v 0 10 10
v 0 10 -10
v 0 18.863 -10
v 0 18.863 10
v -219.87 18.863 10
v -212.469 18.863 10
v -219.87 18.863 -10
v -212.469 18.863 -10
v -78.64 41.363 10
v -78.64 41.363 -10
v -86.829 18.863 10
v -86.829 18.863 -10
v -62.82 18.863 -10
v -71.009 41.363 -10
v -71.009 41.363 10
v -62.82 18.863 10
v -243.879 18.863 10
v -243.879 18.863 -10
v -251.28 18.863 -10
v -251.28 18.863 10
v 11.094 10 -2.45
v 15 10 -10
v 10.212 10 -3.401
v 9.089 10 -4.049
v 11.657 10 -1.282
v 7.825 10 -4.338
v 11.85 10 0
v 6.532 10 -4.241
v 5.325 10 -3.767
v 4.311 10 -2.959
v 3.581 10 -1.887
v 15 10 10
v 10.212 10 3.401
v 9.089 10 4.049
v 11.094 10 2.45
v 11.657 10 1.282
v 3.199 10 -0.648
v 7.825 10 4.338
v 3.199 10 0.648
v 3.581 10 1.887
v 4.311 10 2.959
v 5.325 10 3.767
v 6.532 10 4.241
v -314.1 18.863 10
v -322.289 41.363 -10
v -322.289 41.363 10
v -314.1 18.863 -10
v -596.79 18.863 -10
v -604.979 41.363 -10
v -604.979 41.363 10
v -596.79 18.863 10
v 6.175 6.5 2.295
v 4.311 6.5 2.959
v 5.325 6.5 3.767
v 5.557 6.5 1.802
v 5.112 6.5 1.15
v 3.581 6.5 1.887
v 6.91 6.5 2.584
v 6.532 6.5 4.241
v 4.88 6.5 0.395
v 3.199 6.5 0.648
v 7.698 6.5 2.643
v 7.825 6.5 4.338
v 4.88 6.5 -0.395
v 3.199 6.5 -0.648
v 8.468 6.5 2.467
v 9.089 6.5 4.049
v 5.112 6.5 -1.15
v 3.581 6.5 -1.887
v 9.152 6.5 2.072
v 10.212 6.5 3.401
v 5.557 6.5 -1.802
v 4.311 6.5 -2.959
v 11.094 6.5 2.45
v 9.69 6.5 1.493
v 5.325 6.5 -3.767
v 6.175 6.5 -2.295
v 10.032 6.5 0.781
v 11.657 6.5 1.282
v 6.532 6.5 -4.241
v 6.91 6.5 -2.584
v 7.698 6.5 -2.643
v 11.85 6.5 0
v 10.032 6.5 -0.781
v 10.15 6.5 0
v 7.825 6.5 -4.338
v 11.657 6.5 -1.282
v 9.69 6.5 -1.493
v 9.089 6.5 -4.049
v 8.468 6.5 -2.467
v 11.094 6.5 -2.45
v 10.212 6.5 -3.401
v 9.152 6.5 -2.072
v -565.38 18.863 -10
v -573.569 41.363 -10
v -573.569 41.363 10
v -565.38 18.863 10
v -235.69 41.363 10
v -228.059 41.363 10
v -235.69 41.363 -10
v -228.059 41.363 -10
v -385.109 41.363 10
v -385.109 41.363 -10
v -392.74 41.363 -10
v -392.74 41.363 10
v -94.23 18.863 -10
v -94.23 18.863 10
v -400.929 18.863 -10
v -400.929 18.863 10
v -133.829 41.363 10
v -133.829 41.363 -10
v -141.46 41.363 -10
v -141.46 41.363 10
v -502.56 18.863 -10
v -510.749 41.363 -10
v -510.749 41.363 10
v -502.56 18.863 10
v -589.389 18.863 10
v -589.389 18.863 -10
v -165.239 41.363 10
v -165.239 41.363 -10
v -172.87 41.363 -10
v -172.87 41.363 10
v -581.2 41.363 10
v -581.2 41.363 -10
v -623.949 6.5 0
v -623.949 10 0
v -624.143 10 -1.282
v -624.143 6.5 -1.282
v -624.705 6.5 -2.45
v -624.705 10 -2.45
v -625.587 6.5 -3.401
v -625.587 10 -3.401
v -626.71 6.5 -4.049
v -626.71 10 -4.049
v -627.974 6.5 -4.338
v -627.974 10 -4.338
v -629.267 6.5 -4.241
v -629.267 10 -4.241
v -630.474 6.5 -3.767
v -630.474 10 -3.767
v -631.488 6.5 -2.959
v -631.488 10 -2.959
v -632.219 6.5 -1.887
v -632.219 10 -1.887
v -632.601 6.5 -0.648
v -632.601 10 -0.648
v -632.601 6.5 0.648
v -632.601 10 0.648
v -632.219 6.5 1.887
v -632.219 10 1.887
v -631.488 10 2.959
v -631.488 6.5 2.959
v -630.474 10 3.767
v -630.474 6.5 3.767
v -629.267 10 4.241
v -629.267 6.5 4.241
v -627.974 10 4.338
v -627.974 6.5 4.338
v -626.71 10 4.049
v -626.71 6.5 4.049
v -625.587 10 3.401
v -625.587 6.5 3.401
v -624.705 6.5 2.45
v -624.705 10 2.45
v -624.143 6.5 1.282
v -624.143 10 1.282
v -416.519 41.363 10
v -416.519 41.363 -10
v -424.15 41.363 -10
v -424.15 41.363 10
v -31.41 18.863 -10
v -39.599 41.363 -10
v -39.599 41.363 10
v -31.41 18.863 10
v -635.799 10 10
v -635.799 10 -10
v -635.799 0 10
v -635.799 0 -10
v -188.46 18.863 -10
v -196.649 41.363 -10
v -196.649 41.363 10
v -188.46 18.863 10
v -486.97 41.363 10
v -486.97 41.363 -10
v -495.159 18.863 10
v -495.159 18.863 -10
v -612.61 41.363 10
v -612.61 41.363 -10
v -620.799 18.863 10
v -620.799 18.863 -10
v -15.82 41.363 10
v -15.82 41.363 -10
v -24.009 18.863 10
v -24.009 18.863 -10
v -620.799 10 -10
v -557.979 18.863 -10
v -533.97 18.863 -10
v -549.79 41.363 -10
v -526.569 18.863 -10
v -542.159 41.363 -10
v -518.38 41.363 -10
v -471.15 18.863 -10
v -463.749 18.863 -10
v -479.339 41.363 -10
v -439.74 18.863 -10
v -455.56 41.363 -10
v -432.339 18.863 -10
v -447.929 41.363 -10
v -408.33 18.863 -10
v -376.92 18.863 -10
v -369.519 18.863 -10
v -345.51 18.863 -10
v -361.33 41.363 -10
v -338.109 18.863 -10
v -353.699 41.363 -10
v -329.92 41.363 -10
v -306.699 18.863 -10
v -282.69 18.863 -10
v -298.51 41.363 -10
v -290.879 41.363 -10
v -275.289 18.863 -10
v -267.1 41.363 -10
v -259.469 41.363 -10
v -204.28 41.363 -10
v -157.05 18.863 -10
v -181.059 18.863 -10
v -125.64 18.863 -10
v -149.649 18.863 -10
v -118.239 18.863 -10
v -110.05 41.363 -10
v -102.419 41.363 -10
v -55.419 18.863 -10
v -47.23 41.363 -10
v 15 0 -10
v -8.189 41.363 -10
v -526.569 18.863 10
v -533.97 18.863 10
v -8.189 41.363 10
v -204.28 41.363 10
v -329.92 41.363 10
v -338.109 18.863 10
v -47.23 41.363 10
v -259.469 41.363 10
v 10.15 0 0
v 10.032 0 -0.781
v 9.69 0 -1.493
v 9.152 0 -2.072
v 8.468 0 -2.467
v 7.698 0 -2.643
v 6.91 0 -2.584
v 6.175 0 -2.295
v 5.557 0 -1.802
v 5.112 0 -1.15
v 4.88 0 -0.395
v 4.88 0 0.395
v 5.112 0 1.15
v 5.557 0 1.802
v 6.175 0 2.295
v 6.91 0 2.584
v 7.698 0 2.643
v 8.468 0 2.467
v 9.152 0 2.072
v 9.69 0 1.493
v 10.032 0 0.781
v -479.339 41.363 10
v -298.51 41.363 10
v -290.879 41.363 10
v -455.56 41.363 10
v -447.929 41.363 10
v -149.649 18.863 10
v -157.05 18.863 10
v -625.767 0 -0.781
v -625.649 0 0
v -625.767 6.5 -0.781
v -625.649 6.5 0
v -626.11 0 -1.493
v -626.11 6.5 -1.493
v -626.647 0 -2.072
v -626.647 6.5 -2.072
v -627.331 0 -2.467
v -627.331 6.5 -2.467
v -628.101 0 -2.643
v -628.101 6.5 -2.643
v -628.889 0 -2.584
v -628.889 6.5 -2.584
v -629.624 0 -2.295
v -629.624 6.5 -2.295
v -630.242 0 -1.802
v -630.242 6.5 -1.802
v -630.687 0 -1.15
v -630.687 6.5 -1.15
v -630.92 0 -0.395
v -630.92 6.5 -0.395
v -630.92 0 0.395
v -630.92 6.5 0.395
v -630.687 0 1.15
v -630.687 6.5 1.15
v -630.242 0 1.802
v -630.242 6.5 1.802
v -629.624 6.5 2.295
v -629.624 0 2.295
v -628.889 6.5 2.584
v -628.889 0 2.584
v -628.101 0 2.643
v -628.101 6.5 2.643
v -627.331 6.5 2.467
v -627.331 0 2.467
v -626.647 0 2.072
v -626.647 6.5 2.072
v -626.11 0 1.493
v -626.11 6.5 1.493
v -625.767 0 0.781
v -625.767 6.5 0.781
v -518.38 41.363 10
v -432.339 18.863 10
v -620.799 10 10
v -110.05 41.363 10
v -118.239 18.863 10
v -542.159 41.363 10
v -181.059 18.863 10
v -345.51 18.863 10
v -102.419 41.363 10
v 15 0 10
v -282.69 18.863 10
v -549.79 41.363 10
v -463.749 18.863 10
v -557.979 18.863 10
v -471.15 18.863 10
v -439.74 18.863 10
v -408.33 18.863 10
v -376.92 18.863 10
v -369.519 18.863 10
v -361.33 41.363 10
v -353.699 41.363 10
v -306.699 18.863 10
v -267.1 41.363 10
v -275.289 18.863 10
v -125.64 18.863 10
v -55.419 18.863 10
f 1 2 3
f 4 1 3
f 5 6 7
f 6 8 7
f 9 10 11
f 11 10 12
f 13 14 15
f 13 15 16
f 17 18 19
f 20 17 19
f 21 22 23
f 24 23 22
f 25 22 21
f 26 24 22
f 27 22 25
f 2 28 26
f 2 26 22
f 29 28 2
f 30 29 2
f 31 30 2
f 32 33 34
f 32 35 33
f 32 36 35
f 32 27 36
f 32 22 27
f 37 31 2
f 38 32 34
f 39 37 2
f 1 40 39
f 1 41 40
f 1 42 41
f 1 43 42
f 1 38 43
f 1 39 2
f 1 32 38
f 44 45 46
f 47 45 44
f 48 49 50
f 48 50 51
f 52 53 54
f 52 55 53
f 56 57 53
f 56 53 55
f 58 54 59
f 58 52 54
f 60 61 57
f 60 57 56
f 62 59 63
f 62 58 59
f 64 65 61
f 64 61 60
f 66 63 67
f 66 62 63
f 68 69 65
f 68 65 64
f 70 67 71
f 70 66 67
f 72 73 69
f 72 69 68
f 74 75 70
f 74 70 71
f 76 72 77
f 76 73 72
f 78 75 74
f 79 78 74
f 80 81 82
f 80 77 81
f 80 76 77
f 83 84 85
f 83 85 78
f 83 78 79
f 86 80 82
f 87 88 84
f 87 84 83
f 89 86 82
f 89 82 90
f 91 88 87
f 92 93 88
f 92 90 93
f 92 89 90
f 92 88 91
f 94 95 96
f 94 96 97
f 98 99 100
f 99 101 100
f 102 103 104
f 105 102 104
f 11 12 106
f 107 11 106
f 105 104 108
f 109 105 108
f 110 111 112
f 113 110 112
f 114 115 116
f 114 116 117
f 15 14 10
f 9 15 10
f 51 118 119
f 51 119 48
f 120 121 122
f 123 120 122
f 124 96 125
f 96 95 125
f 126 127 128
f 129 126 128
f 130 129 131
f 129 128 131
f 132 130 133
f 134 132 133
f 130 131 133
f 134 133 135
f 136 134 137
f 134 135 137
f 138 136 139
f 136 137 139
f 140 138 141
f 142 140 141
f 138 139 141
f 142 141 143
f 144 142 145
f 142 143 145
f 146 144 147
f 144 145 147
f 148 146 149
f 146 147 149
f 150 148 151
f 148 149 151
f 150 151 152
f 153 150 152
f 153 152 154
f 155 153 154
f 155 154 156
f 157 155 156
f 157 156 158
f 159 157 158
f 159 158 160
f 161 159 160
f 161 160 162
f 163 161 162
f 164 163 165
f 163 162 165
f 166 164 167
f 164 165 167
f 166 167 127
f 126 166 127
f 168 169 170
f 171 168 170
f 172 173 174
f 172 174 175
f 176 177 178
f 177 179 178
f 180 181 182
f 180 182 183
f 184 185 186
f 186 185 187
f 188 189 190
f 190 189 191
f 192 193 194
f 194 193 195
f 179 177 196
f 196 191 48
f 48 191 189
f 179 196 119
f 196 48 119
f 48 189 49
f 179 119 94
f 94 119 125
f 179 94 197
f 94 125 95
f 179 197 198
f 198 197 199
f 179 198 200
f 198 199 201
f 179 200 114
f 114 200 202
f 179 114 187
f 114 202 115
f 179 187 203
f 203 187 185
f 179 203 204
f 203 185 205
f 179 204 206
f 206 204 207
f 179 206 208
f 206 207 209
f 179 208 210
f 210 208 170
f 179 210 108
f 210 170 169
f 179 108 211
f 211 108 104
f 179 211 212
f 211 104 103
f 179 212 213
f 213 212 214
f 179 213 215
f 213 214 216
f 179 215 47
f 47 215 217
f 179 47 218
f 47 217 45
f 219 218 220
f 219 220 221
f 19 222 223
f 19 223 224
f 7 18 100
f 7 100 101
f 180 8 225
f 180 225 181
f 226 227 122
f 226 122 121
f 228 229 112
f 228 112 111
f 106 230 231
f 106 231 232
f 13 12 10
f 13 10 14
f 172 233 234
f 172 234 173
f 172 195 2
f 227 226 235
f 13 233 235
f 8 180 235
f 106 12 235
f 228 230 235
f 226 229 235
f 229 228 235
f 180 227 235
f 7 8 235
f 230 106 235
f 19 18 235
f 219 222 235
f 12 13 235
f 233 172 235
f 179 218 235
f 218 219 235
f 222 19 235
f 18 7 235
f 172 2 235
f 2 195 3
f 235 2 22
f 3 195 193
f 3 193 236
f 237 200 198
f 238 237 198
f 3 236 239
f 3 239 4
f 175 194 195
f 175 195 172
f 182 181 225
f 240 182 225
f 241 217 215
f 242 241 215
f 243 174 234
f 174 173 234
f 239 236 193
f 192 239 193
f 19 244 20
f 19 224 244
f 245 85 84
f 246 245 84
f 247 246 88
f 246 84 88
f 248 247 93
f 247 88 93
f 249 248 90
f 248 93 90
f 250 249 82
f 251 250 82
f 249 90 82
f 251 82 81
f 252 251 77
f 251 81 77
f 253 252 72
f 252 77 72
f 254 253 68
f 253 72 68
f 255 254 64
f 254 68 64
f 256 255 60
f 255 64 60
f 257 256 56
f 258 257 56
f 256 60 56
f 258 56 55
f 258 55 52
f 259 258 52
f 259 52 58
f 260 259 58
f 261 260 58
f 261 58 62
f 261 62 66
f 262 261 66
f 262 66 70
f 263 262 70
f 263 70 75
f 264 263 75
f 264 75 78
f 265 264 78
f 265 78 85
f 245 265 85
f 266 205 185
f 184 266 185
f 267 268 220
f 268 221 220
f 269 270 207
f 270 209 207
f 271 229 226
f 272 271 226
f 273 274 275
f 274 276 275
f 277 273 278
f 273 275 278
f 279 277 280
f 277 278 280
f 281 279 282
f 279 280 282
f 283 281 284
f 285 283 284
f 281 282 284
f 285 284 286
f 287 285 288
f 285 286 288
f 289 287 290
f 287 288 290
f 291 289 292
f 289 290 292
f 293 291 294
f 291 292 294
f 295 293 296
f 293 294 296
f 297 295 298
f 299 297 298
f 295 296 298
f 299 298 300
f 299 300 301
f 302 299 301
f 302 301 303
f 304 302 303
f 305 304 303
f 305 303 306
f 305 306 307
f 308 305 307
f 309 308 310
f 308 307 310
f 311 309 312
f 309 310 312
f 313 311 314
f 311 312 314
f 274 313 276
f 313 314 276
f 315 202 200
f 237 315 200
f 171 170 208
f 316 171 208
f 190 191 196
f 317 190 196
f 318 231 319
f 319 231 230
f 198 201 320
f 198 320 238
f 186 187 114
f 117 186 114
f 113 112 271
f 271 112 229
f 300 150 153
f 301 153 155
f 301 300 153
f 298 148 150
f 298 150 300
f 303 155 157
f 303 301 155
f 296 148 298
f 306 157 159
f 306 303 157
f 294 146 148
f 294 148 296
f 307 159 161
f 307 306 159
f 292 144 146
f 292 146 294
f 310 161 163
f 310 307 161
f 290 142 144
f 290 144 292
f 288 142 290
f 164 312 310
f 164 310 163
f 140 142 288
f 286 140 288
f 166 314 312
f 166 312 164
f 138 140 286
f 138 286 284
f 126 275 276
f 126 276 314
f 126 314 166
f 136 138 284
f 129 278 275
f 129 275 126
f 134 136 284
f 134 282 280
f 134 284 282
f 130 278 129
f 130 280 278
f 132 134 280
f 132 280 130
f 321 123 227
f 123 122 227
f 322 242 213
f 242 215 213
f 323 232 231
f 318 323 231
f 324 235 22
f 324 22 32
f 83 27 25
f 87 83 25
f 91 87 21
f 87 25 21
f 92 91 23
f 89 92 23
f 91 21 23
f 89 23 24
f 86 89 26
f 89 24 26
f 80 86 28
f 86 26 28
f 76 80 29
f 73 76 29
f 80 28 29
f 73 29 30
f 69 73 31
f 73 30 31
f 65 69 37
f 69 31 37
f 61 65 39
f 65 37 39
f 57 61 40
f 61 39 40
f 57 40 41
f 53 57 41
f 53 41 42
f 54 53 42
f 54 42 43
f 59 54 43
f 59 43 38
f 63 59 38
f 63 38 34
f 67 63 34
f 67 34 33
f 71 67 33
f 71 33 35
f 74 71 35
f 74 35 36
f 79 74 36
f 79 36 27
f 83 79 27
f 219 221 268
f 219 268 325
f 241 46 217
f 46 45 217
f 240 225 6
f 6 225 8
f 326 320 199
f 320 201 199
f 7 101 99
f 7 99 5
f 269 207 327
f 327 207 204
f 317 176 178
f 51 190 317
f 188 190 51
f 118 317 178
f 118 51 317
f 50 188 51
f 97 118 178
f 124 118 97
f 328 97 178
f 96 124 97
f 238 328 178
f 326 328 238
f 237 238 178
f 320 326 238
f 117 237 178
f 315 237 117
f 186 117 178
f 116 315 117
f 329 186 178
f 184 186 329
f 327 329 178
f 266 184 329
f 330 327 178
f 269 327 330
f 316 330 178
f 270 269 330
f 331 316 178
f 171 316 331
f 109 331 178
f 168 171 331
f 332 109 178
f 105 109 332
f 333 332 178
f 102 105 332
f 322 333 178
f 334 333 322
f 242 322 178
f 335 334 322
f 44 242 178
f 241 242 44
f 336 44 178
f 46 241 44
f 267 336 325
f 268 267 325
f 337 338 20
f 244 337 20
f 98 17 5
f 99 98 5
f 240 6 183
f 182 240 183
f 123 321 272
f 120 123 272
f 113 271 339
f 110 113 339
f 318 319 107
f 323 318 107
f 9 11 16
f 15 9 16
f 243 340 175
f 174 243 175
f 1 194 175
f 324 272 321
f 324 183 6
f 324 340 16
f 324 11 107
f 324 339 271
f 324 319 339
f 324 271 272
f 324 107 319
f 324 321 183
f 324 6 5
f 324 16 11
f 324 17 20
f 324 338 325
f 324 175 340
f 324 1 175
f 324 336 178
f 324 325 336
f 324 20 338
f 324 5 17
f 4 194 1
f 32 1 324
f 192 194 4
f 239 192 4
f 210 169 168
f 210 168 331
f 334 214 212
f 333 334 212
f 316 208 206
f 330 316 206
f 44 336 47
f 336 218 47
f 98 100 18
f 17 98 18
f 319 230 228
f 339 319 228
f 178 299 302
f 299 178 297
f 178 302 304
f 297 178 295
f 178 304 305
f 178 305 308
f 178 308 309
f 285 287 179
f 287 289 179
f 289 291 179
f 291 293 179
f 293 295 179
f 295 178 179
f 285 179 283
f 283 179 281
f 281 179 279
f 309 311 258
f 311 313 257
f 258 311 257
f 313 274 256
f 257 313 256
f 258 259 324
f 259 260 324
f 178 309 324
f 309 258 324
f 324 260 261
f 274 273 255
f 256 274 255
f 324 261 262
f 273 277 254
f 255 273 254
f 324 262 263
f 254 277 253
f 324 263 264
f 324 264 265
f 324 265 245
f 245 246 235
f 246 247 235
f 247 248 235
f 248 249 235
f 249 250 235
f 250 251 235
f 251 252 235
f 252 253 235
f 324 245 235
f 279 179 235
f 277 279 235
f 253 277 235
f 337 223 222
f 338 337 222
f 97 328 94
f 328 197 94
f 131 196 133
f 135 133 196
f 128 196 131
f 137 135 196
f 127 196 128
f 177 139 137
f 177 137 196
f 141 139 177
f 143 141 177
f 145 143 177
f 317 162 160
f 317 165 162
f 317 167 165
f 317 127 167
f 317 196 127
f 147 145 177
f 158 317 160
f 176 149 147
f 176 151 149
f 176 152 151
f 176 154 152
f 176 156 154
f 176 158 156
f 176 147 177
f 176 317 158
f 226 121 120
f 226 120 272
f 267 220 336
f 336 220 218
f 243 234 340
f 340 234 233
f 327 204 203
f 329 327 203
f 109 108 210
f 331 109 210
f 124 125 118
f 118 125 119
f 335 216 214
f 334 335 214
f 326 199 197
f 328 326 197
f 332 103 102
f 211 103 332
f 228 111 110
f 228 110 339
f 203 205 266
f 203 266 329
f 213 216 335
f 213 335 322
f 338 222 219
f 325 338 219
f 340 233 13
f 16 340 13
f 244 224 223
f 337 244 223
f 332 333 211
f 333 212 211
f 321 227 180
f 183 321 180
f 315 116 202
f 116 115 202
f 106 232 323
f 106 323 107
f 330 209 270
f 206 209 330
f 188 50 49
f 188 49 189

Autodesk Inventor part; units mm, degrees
ref_plane "YZ Plane" through (0, 0, 0) normal (1, 0, 0) x (0, 1, 0)
ref_plane "XZ Plane" through (0, 0, 0) normal (0, 1, 0) x (-1, 0, 0)
ref_plane "XY Plane" through (0, 0, 0) normal (0, 0, 1) x (1, 0, 0)
sketch "Sketch1" plane through (0, 0, 0) normal (0, 0, 1) x (1, 0, 0)
  line L0 (-8.1893, 41.3629) -> (-15.8199, 41.3629)
  line L1 (-8.1893, 41.3629) -> (0, 18.8629)
  line L2 (-8.1893, 41.3629) -> (26.4246, 41.3629) construction
  line L3 (-4.5496, 31.3629) -> (-19.4596, 31.3629) construction
  line L4 (-12.0046, 31.3629) -> (-12.0046, 41.3629) construction
  line L5 (-15.8199, 41.3629) -> (-24.0093, 18.8629)
  line L6 (-39.5993, 41.3629) -> (-47.2299, 41.3629)
  line L7 (-39.5993, 41.3629) -> (-31.41, 18.8629)
  line L8 (-39.5993, 41.3629) -> (-4.9854, 41.3629) construction
  line L9 (-35.9596, 31.3629) -> (-50.8696, 31.3629) construction
  line L10 (-43.4146, 31.3629) -> (-43.4146, 41.3629) construction
  line L11 (-47.2299, 41.3629) -> (-55.4193, 18.8629)
  line L12 (-71.0093, 41.3629) -> (-78.6399, 41.3629)
  line L13 (-71.0093, 41.3629) -> (-62.82, 18.8629)
  line L14 (-71.0093, 41.3629) -> (-36.3954, 41.3629) construction
  line L15 (-67.3696, 31.3629) -> (-82.2796, 31.3629) construction
  line L16 (-74.8246, 31.3629) -> (-74.8246, 41.3629) construction
  line L17 (-78.6399, 41.3629) -> (-86.8293, 18.8629)
  line L18 (-102.4193, 41.3629) -> (-110.0499, 41.3629)
  line L19 (-102.4193, 41.3629) -> (-94.23, 18.8629)
  line L20 (-102.4193, 41.3629) -> (-67.8054, 41.3629) construction
  line L21 (-98.7796, 31.3629) -> (-113.6896, 31.3629) construction
  line L22 (-106.2346, 31.3629) -> (-106.2346, 41.3629) construction
  line L23 (-110.0499, 41.3629) -> (-118.2393, 18.8629)
  line L24 (-133.8293, 41.3629) -> (-141.4599, 41.3629)
  line L25 (-133.8293, 41.3629) -> (-125.64, 18.8629)
  line L26 (-133.8293, 41.3629) -> (-99.2154, 41.3629) construction
  line L27 (-130.1896, 31.3629) -> (-145.0996, 31.3629) construction
  line L28 (-137.6446, 31.3629) -> (-137.6446, 41.3629) construction
  line L29 (-141.4599, 41.3629) -> (-149.6493, 18.8629)
  line L30 (-165.2393, 41.3629) -> (-172.8699, 41.3629)
  line L31 (-165.2393, 41.3629) -> (-157.05, 18.8629)
  line L32 (-165.2393, 41.3629) -> (-130.6254, 41.3629) construction
  line L33 (-161.5996, 31.3629) -> (-176.5096, 31.3629) construction
  line L34 (-169.0546, 31.3629) -> (-169.0546, 41.3629) construction
  line L35 (-172.8699, 41.3629) -> (-181.0593, 18.8629)
  line L36 (-196.6493, 41.3629) -> (-204.2799, 41.3629)
  line L37 (-196.6493, 41.3629) -> (-188.46, 18.8629)
  line L38 (-196.6493, 41.3629) -> (-162.0354, 41.3629) construction
  line L39 (-193.0096, 31.3629) -> (-207.9196, 31.3629) construction
  line L40 (-200.4646, 31.3629) -> (-200.4646, 41.3629) construction
  line L41 (-204.2799, 41.3629) -> (-212.4693, 18.8629)
  line L42 (-228.0593, 41.3629) -> (-235.6899, 41.3629)
  line L43 (-228.0593, 41.3629) -> (-219.87, 18.8629)
  line L44 (-228.0593, 41.3629) -> (-193.4454, 41.3629) construction
  line L45 (-224.4196, 31.3629) -> (-239.3296, 31.3629) construction
  line L46 (-231.8746, 31.3629) -> (-231.8746, 41.3629) construction
  line L47 (-235.6899, 41.3629) -> (-243.8793, 18.8629)
  line L48 (-259.4693, 41.3629) -> (-267.0999, 41.3629)
  line L49 (-259.4693, 41.3629) -> (-251.28, 18.8629)
  line L50 (-259.4693, 41.3629) -> (-224.8554, 41.3629) construction
  line L51 (-255.8296, 31.3629) -> (-270.7396, 31.3629) construction
  line L52 (-263.2846, 31.3629) -> (-263.2846, 41.3629) construction
  line L53 (-267.0999, 41.3629) -> (-275.2893, 18.8629)
  line L54 (-290.8793, 41.3629) -> (-298.5099, 41.3629)
  line L55 (-290.8793, 41.3629) -> (-282.69, 18.8629)
  line L56 (-290.8793, 41.3629) -> (-256.2654, 41.3629) construction
  line L57 (-287.2396, 31.3629) -> (-302.1496, 31.3629) construction
  line L58 (-294.6946, 31.3629) -> (-294.6946, 41.3629) construction
  line L59 (-298.5099, 41.3629) -> (-306.6993, 18.8629)
  line L60 (-322.2893, 41.3629) -> (-329.9199, 41.3629)
  line L61 (-322.2893, 41.3629) -> (-314.1, 18.8629)
  line L62 (-322.2893, 41.3629) -> (-287.6754, 41.3629) construction
  line L63 (-318.6496, 31.3629) -> (-333.5596, 31.3629) construction
  line L64 (-326.1046, 31.3629) -> (-326.1046, 41.3629) construction
  line L65 (-329.9199, 41.3629) -> (-338.1093, 18.8629)
  line L66 (-353.6993, 41.3629) -> (-361.3299, 41.3629)
  line L67 (-353.6993, 41.3629) -> (-345.51, 18.8629)
  line L68 (-353.6993, 41.3629) -> (-319.0854, 41.3629) construction
  line L69 (-350.0596, 31.3629) -> (-364.9696, 31.3629) construction
  line L70 (-357.5146, 31.3629) -> (-357.5146, 41.3629) construction
  line L71 (-361.3299, 41.3629) -> (-369.5193, 18.8629)
  line L72 (-385.1093, 41.3629) -> (-392.7399, 41.3629)
  line L73 (-385.1093, 41.3629) -> (-376.92, 18.8629)
  line L74 (-385.1093, 41.3629) -> (-350.4954, 41.3629) construction
  line L75 (-381.4696, 31.3629) -> (-396.3796, 31.3629) construction
  line L76 (-388.9246, 31.3629) -> (-388.9246, 41.3629) construction
  line L77 (-392.7399, 41.3629) -> (-400.9293, 18.8629)
  line L78 (-416.5193, 41.3629) -> (-424.1499, 41.3629)
  line L79 (-416.5193, 41.3629) -> (-408.33, 18.8629)
  line L80 (-416.5193, 41.3629) -> (-381.9054, 41.3629) construction
  line L81 (-412.8796, 31.3629) -> (-427.7896, 31.3629) construction
  line L82 (-420.3346, 31.3629) -> (-420.3346, 41.3629) construction
  line L83 (-424.1499, 41.3629) -> (-432.3393, 18.8629)
  line L84 (-447.9293, 41.3629) -> (-455.5599, 41.3629)
  line L85 (-447.9293, 41.3629) -> (-439.74, 18.8629)
  line L86 (-447.9293, 41.3629) -> (-413.3154, 41.3629) construction
  line L87 (-444.2896, 31.3629) -> (-459.1996, 31.3629) construction
  line L88 (-451.7446, 31.3629) -> (-451.7446, 41.3629) construction
  line L89 (-455.5599, 41.3629) -> (-463.7493, 18.8629)
  line L90 (-479.3393, 41.3629) -> (-486.9699, 41.3629)
  line L91 (-479.3393, 41.3629) -> (-471.15, 18.8629)
  line L92 (-479.3393, 41.3629) -> (-444.7254, 41.3629) construction
  line L93 (-475.6996, 31.3629) -> (-490.6096, 31.3629) construction
  line L94 (-483.1546, 31.3629) -> (-483.1546, 41.3629) construction
  line L95 (-486.9699, 41.3629) -> (-495.1593, 18.8629)
  line L96 (-510.7493, 41.3629) -> (-518.3799, 41.3629)
  line L97 (-510.7493, 41.3629) -> (-502.56, 18.8629)
  line L98 (-510.7493, 41.3629) -> (-476.1354, 41.3629) construction
  line L99 (-507.1096, 31.3629) -> (-522.0196, 31.3629) construction
  line L100 (-514.5646, 31.3629) -> (-514.5646, 41.3629) construction
  line L101 (-518.3799, 41.3629) -> (-526.5693, 18.8629)
  line L102 (-542.1593, 41.3629) -> (-549.7899, 41.3629)
  line L103 (-542.1593, 41.3629) -> (-533.97, 18.8629)
  line L104 (-542.1593, 41.3629) -> (-507.5454, 41.3629) construction
  line L105 (-538.5196, 31.3629) -> (-553.4296, 31.3629) construction
  line L106 (-545.9746, 31.3629) -> (-545.9746, 41.3629) construction
  line L107 (-549.7899, 41.3629) -> (-557.9793, 18.8629)
  line L108 (-573.5693, 41.3629) -> (-581.1999, 41.3629)
  line L109 (-573.5693, 41.3629) -> (-565.38, 18.8629)
  line L110 (-573.5693, 41.3629) -> (-538.9554, 41.3629) construction
  line L111 (-569.9296, 31.3629) -> (-584.8396, 31.3629) construction
  line L112 (-577.3846, 31.3629) -> (-577.3846, 41.3629) construction
  line L113 (-581.1999, 41.3629) -> (-589.3893, 18.8629)
  line L114 (-604.9793, 41.3629) -> (-612.6099, 41.3629)
  line L115 (-604.9793, 41.3629) -> (-596.79, 18.8629)
  line L116 (-604.9793, 41.3629) -> (-570.3654, 41.3629) construction
  line L117 (-601.3396, 31.3629) -> (-616.2496, 31.3629) construction
  line L118 (-608.7946, 31.3629) -> (-608.7946, 41.3629) construction
  line L119 (-612.6099, 41.3629) -> (-620.7993, 18.8629)
  line L120 (-620.7993, 18.8629) -> (-620.7993, 0)
  line L121 (-620.7993, 0) -> (0, 0)
  line L122 (0, 0) -> (0, 18.8629)
  line L123 (-24.0093, 18.8629) -> (-31.41, 18.8629)
  line L124 (-55.4193, 18.8629) -> (-62.82, 18.8629)
  line L125 (-86.8293, 18.8629) -> (-94.23, 18.8629)
  line L126 (-118.2393, 18.8629) -> (-125.64, 18.8629)
  line L127 (-149.6493, 18.8629) -> (-157.05, 18.8629)
  line L128 (-181.0593, 18.8629) -> (-188.46, 18.8629)
  line L129 (-212.4693, 18.8629) -> (-219.87, 18.8629)
  line L130 (-243.8793, 18.8629) -> (-251.28, 18.8629)
  line L131 (-275.2893, 18.8629) -> (-282.69, 18.8629)
  line L132 (-306.6993, 18.8629) -> (-314.1, 18.8629)
  line L133 (-338.1093, 18.8629) -> (-345.51, 18.8629)
  line L134 (-369.5193, 18.8629) -> (-376.92, 18.8629)
  line L135 (-400.9293, 18.8629) -> (-408.33, 18.8629)
  line L136 (-432.3393, 18.8629) -> (-439.74, 18.8629)
  line L137 (-463.7493, 18.8629) -> (-471.15, 18.8629)
  line L138 (-495.1593, 18.8629) -> (-502.56, 18.8629)
  line L139 (-526.5693, 18.8629) -> (-533.97, 18.8629)
  line L140 (-557.9793, 18.8629) -> (-565.38, 18.8629)
  line L141 (-589.3893, 18.8629) -> (-596.79, 18.8629)
  point P0 (2.0713, 13.1721)
  point P1 (-26.0805, 13.1721)
  point P2 (-29.3387, 13.1721)
  point P3 (-57.4905, 13.1721)
  point P4 (-60.7487, 13.1721)
  point P5 (-88.9005, 13.1721)
  point P6 (-92.1587, 13.1721)
  point P7 (-120.3105, 13.1721)
  point P8 (-123.5687, 13.1721)
  point P9 (-151.7205, 13.1721)
  point P10 (-154.9787, 13.1721)
  point P11 (-183.1305, 13.1721)
  point P12 (-186.3887, 13.1721)
  point P13 (-214.5405, 13.1721)
  point P14 (-217.7987, 13.1721)
  point P15 (-245.9505, 13.1721)
  point P16 (-249.2087, 13.1721)
  point P17 (-277.3605, 13.1721)
  point P18 (-280.6187, 13.1721)
  point P19 (-308.7705, 13.1721)
  point P20 (-312.0287, 13.1721)
  point P21 (-340.1805, 13.1721)
  point P22 (-343.4387, 13.1721)
  point P23 (-371.5905, 13.1721)
  point P24 (-374.8487, 13.1721)
  point P25 (-403.0005, 13.1721)
  point P26 (-406.2587, 13.1721)
  point P27 (-434.4105, 13.1721)
  point P28 (-437.6687, 13.1721)
  point P29 (-465.8205, 13.1721)
  point P30 (-469.0787, 13.1721)
  point P31 (-497.2305, 13.1721)
  point P32 (-500.4887, 13.1721)
  point P33 (-528.6405, 13.1721)
  point P34 (-531.8987, 13.1721)
  point P35 (-560.0505, 13.1721)
  point P36 (-563.3087, 13.1721)
  point P37 (-591.4605, 13.1721)
  point P38 (-594.7187, 13.1721)
  point P39 (-622.8705, 13.1721)
  point P40 (-59.1196, 18.8629)
  point P41 (0, 9.4315)
  dimension "d3" = 30
  dimension "d4" = 70
  dimension "d5" = 14.91
  dimension "d8" = 31.41
  dimension "d14" = 620.7993
  dimension "d15" = 18.8629
  dimension "d16" = 18.8629
  dimension "d18" = 13.1722
  dimension "d19" = 13.1722
  dimension "d20" = 24.0093
  dimension "d21" = 22.5
  dimension "d22" = 23.944
  dimension "d23" = 3.0107
  dimension "d24" = 18.8629
extrude "Extrusion1" add sketch "Sketch1" along normal mid plane 20
sketch "Sketch2" plane through (0, 0, 0) normal (0, 1, 0) x (-1, 0, 0)
  line L0 (8.1893, -10) -> (8.1893, 10) construction
  line L1 (0, 10) -> (8.1893, 10) construction
  line L2 (0, -10) -> (0, 10) construction
  line L3 (8.1893, -10) -> (0, -10) construction
  line L4 (0, -10) -> (-15, -10)
  line L5 (-15, -10) -> (-15, 10)
  line L6 (-15, 10) -> (0, 10)
  line L7 (0, 10) -> (0, -10)
  line L8 (620.7993, -10) -> (620.7993, 10) construction
  line L9 (612.6099, 10) -> (620.7993, 10) construction
  line L10 (612.6099, 10) -> (612.6099, -10) construction
  line L11 (620.7993, -10) -> (612.6099, -10) construction
  line L12 (620.7993, -10) -> (635.7993, -10)
  line L13 (635.7993, -10) -> (635.7993, 10)
  line L14 (635.7993, 10) -> (620.7993, 10)
  line L15 (620.7993, 10) -> (620.7993, -10)
  point P0 (0, 0)
  dimension "d27" = 15
  dimension "d28" = 20
  dimension "d29" = 15
  dimension "d30" = 20
extrude "Extrusion2" add sketch "Sketch2" along normal blind 10
sketch "Sketch3" plane through (0, 10, 0) normal (0, 1, 0) x (1, 0, 0)
  line L0 (0, -10) -> (15, -10) construction
  line L1 (15, -10) -> (15, 10) construction
  line L2 (15, 10) -> (0, 10) construction
  line L3 (0, -10) -> (0, 10) construction
  line L4 (-635.7993, 10) -> (-635.7993, -10) construction
  line L5 (-635.7993, -10) -> (-620.7993, -10) construction
  line L6 (-620.7993, 10) -> (-620.7993, -10) construction
  line L7 (-620.7993, 10) -> (-635.7993, 10) construction
  line L8 (15, 10) -> (-635.7993, 10) construction
  line L9 (-635.7993, -10) -> (15, -10) construction
  line L10 (-310.3996, -10) -> (-310.3996, 10) construction
  circle A0 centre (7.5, 0) radius 2.65
  circle A1 centre (-628.2993, 0) radius 2.65
  point P0 (0, 0)
  point P1 (0, -12.5)
  point P2 (-620.7993, -12.5)
  point P3 (0, 0)
  point P4 (7.5, 10)
  dimension "d33" = 5.3
extrude "Extrusion3" cut sketch "Sketch3" against normal through all
sketch "Sketch4" plane through (0, 10, 0) normal (0, 1, 0) x (1, 0, 0)
  circle A0 centre (-628.2993, 0) radius 2.65 construction
  line L0 (-635.7993, 10) -> (-635.7993, -10) construction
  line L1 (-635.7993, -10) -> (-620.7993, -10) construction
  line L2 (-620.7993, 10) -> (-620.7993, -10) construction
  line L3 (-620.7993, 10) -> (-635.7993, 10) construction
  circle A1 centre (7.5, 0) radius 2.65 construction
  line L4 (0, -10) -> (15, -10) construction
  line L5 (15, -10) -> (15, 10) construction
  line L6 (15, 10) -> (0, 10) construction
  line L7 (0, -10) -> (0, 10) construction
  line L8 (15, 10) -> (-635.7993, 10) construction
  line L9 (-635.7993, -10) -> (15, -10) construction
  line L10 (-310.3996, 10) -> (-310.3996, -10) construction
  circle A2 centre (7.5, 0) radius 4.35
  circle A3 centre (-628.2993, 0) radius 4.35
  point P0 (0, 0)
  point P1 (-620.7993, -12.5)
  point P2 (0, -12.5)
  dimension "d36" = 8.7
extrude "Extrusion4" cut sketch "Sketch4" against normal blind 3.5
properties part number "cremallera1"
